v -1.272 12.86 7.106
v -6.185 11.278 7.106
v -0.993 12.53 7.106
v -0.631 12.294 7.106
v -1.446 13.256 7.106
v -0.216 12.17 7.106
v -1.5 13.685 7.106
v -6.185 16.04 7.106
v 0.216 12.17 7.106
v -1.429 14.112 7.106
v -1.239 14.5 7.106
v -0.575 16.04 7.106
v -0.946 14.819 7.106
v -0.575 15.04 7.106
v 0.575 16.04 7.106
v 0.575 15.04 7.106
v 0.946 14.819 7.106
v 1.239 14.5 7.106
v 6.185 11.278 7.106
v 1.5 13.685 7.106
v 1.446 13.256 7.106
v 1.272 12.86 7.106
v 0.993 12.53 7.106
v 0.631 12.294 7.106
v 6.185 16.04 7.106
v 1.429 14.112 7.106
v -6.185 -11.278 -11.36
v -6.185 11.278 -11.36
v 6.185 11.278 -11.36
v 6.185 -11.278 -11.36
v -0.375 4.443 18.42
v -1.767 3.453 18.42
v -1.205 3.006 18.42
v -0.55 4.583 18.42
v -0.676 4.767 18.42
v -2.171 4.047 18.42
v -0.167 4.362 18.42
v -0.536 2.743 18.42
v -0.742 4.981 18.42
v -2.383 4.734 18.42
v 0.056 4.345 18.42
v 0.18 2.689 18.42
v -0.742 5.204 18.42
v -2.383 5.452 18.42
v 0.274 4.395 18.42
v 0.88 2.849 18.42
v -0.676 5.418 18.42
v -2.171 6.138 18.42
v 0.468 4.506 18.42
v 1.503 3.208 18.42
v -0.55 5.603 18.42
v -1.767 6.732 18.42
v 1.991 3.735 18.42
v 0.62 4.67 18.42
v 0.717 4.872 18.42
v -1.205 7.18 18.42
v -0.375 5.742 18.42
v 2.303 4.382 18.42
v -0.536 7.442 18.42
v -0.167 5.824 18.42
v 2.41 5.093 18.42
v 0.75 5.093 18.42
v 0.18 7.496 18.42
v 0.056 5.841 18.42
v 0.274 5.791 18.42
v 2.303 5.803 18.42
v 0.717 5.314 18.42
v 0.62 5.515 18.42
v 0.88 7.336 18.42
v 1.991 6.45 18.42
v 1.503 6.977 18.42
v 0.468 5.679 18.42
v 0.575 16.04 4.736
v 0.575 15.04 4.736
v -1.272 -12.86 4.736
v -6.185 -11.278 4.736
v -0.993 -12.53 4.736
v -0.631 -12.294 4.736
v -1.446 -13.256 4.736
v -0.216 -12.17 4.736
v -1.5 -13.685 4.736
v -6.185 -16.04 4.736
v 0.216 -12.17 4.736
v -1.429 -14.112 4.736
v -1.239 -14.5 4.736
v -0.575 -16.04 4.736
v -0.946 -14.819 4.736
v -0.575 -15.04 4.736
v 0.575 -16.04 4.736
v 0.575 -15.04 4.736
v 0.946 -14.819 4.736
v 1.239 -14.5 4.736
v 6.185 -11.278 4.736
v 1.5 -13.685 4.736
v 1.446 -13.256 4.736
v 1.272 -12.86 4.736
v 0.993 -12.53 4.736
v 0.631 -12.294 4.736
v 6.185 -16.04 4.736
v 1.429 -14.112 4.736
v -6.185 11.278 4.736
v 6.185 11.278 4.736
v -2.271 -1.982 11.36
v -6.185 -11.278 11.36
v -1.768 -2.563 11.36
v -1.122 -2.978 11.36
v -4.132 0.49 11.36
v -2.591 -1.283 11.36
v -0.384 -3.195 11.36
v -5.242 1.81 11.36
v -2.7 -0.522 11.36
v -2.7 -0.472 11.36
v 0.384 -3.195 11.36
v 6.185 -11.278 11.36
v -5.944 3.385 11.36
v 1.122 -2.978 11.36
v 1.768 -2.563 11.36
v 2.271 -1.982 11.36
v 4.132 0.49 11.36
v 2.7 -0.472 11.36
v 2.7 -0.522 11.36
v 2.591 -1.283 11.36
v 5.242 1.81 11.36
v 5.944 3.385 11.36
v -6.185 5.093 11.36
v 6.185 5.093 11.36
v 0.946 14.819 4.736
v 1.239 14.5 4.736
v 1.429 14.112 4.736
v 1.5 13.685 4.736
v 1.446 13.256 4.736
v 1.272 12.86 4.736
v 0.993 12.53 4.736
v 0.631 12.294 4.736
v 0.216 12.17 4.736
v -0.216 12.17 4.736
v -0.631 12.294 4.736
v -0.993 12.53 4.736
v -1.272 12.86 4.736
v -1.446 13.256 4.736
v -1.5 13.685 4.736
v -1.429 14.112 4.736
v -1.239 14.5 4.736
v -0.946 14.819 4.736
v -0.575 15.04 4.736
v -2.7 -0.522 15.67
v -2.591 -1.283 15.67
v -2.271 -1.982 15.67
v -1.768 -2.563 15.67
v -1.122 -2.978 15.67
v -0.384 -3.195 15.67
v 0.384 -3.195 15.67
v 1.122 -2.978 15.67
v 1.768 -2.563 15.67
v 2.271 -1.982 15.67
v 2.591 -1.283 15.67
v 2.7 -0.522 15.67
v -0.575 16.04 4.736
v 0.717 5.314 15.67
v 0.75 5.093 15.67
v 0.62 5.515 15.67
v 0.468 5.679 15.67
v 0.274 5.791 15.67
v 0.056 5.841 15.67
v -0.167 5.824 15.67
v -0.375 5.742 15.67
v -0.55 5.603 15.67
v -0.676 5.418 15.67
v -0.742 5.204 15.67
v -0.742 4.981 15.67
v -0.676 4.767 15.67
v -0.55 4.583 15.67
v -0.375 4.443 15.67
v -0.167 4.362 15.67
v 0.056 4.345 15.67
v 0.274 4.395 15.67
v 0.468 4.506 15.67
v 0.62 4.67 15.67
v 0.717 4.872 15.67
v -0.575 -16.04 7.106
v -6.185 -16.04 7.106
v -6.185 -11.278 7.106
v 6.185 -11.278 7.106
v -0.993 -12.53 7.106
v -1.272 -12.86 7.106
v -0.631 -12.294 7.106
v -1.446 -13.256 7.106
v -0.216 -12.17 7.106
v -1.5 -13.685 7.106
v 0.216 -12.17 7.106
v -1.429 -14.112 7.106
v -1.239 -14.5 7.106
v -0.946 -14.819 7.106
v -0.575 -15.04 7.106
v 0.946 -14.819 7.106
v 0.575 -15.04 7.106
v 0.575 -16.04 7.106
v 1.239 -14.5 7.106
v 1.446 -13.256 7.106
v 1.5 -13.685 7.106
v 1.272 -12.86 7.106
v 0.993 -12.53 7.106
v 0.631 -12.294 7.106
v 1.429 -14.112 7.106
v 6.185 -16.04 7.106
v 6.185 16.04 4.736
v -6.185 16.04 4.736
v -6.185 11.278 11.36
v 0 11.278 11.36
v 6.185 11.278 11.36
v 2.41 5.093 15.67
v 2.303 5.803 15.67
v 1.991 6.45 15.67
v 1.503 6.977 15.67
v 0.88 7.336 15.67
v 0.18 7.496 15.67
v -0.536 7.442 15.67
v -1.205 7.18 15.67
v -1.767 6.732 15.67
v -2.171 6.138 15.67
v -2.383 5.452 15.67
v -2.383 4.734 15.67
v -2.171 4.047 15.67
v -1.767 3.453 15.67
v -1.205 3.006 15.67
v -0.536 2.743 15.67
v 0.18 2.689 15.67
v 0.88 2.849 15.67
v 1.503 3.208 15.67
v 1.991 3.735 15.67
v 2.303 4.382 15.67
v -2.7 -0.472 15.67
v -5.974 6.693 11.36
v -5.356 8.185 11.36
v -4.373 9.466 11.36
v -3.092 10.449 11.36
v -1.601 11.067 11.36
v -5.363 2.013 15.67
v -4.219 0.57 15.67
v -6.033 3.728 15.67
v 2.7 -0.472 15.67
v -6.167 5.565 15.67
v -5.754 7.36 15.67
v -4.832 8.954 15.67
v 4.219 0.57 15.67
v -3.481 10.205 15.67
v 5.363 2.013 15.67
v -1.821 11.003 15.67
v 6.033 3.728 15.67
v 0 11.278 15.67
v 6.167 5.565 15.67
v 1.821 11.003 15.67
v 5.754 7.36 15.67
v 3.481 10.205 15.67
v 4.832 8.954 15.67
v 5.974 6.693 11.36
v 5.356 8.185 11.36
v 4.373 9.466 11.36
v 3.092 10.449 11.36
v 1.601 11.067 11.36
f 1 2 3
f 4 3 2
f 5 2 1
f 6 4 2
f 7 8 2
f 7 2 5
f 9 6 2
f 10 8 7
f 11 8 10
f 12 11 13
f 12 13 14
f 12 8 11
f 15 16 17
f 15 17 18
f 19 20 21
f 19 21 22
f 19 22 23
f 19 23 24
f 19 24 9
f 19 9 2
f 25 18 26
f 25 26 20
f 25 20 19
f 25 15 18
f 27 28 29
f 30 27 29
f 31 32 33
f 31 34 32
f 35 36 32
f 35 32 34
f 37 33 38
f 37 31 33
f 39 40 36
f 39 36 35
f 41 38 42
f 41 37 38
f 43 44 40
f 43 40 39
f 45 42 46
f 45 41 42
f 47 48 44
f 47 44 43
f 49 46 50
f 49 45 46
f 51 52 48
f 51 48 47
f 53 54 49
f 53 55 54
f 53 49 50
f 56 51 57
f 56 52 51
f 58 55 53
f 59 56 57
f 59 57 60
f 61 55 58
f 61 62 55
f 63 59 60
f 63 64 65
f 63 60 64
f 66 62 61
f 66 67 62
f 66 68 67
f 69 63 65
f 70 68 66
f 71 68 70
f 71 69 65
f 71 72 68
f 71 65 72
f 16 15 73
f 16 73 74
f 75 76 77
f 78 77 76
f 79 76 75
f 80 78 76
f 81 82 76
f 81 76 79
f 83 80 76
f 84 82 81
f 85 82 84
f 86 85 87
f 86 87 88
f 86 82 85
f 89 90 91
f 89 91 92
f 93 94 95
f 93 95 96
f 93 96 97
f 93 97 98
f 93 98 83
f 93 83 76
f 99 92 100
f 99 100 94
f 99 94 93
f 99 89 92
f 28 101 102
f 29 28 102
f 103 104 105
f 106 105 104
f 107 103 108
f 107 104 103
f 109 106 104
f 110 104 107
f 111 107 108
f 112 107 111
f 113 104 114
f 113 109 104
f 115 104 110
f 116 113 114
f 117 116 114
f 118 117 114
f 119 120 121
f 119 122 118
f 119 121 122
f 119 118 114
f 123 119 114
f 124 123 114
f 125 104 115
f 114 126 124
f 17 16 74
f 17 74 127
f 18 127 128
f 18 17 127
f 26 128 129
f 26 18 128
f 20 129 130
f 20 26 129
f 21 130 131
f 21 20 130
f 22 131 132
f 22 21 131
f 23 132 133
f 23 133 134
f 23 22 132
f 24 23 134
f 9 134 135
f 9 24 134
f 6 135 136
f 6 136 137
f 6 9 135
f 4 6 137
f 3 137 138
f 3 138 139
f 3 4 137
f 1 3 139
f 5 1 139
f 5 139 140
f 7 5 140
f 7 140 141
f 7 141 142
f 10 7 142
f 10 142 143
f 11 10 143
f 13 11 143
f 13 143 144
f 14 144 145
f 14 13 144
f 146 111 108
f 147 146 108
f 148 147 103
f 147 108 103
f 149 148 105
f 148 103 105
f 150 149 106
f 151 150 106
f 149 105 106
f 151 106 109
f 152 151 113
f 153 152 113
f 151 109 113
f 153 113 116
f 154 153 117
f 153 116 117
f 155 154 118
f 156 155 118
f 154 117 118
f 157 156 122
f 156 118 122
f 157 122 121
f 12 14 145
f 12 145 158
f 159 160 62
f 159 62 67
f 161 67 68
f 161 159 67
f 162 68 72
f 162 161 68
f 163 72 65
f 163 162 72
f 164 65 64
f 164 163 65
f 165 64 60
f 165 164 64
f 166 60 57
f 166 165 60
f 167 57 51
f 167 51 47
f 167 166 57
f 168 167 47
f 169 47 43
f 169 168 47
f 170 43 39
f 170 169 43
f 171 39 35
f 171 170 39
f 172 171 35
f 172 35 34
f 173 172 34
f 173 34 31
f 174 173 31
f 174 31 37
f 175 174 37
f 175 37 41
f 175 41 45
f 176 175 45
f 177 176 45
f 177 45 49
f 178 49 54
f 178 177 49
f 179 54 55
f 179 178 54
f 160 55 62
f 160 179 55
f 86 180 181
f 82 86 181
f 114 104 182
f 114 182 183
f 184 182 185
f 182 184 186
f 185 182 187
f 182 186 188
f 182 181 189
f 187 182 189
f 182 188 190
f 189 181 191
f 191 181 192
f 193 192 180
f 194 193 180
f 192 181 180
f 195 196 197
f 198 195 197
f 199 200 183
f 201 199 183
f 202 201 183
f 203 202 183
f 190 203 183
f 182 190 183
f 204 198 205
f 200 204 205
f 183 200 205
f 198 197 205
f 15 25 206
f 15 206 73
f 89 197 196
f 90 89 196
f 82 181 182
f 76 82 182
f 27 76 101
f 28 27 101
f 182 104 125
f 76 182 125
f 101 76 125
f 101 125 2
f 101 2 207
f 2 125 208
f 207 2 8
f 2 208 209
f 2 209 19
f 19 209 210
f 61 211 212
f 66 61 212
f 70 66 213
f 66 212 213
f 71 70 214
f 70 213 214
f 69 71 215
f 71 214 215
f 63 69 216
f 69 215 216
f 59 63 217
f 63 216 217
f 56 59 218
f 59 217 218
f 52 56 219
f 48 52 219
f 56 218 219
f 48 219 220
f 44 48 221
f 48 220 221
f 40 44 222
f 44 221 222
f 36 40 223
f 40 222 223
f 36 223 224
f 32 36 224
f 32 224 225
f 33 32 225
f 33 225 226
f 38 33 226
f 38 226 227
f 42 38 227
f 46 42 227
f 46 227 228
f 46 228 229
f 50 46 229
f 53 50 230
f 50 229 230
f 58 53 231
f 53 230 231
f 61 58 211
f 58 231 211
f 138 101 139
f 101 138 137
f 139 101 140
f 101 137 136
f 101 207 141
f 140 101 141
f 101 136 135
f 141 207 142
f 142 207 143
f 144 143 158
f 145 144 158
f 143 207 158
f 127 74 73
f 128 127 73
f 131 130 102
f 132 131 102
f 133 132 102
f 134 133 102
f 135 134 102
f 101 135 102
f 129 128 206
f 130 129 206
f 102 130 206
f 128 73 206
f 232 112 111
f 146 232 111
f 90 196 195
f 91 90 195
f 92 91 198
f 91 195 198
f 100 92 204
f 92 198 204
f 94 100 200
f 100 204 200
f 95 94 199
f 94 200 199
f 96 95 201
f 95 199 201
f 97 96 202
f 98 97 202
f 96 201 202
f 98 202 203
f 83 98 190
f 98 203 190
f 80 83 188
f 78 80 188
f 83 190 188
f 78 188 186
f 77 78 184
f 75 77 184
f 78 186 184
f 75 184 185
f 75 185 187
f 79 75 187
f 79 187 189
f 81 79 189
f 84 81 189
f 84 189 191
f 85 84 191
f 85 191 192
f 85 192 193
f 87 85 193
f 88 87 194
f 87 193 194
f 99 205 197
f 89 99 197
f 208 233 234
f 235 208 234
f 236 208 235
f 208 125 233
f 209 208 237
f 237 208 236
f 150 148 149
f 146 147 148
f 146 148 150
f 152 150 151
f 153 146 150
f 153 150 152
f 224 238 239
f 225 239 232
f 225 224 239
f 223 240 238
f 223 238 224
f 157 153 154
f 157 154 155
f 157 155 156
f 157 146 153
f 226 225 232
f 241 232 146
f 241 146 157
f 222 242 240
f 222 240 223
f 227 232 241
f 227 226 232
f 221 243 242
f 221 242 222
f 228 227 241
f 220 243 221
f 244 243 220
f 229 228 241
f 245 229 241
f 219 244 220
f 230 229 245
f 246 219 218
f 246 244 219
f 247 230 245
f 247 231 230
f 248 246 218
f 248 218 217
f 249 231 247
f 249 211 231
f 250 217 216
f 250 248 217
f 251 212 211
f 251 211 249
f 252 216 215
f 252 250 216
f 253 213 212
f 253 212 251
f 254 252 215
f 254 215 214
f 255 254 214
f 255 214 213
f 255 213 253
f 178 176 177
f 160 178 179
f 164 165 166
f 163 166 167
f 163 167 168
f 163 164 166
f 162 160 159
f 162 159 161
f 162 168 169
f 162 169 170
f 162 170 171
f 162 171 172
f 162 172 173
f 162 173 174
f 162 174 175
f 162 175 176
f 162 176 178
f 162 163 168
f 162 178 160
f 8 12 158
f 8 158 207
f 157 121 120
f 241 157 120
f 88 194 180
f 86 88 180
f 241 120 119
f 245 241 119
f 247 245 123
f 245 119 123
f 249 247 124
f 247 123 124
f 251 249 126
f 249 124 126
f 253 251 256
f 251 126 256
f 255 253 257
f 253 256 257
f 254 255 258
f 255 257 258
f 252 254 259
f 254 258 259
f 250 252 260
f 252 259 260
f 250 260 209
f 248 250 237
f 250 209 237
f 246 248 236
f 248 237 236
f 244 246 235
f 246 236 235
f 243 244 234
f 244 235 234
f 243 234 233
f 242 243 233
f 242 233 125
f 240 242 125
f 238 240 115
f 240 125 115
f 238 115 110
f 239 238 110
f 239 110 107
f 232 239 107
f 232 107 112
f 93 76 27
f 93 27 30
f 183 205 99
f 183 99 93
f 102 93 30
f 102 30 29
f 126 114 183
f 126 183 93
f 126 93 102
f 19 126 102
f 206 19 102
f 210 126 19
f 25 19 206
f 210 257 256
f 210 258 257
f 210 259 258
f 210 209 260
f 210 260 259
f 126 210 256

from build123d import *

# Parameters (mm, degrees)
SKETCH1_W           = 12.3698
SKETCH1_H           = 22.5552
BOSS_EXTRUDE1_DEPTH = 11.36015
BOSS_EXTRUDE2_DEPTH = 2.37
BOSS_EXTRUDE3_DEPTH = 4.31
SKETCH4_R           = 2.41
SKETCH4_R_2         = 0.75
BOSS_EXTRUDE4_DEPTH = 2.75


with BuildPart() as part:
    # Sketch1 → Boss-Extrude1 (new, symmetric)
    with BuildSketch(Plane.XY):
        Rectangle(SKETCH1_W, SKETCH1_H)
    extrude(amount=BOSS_EXTRUDE1_DEPTH, both=True)

    # Sketch2 → Boss-Extrude2 (add)
    with BuildSketch(Plane.XY.offset(7.10565)):
        with BuildLine():
            Line((-0.575, 16.0401), (-6.1849, 16.0401))
            Line((-6.1849, 16.0401), (-6.1849, 11.2776))
            Line((-6.1849, 11.2776), (6.1849, 11.2776))
            Line((6.1849, 11.2776), (6.1849, 16.0401))
            Line((6.1849, 16.0401), (0.575, 16.0401))
            Line((0.575, 16.0401), (0.575, 15.0401))
            ThreePointArc((0.575, 15.0401), (0, 12.1546849), (-0.575, 15.0401))
            Line((-0.575, 15.0401), (-0.575, 16.0401))
        make_face()
    boss_extrude2 = extrude(amount=-BOSS_EXTRUDE2_DEPTH)

    # Mirror1: Boss-Extrude2 across plane
    add(boss_extrude2.mirror(Plane.ZX))

    # Sketch3 → Boss-Extrude3 (add)
    with BuildSketch(Plane.XY.offset(11.36015)):
        with BuildLine():
            Line((2.7, -0.5224), (2.7, -0.471739595))
            ThreePointArc((2.7, -0.471739595), (0, 11.2776), (-2.7, -0.471739595))
            Line((-2.7, -0.471739595), (-2.7, -0.5224))
            ThreePointArc((-2.7, -0.5224), (0, -3.2224), (2.7, -0.5224))
        make_face()
    extrude(amount=BOSS_EXTRUDE3_DEPTH)

    # Sketch4 → Boss-Extrude4 (add)
    with BuildSketch(Plane.XY.offset(15.67015)):
        with Locations((0, 5.0927)):
            Circle(SKETCH4_R)
        with Locations((0, 5.0927)):
            Circle(SKETCH4_R_2, mode=Mode.SUBTRACT)
    extrude(amount=BOSS_EXTRUDE4_DEPTH)


solid = part.part
